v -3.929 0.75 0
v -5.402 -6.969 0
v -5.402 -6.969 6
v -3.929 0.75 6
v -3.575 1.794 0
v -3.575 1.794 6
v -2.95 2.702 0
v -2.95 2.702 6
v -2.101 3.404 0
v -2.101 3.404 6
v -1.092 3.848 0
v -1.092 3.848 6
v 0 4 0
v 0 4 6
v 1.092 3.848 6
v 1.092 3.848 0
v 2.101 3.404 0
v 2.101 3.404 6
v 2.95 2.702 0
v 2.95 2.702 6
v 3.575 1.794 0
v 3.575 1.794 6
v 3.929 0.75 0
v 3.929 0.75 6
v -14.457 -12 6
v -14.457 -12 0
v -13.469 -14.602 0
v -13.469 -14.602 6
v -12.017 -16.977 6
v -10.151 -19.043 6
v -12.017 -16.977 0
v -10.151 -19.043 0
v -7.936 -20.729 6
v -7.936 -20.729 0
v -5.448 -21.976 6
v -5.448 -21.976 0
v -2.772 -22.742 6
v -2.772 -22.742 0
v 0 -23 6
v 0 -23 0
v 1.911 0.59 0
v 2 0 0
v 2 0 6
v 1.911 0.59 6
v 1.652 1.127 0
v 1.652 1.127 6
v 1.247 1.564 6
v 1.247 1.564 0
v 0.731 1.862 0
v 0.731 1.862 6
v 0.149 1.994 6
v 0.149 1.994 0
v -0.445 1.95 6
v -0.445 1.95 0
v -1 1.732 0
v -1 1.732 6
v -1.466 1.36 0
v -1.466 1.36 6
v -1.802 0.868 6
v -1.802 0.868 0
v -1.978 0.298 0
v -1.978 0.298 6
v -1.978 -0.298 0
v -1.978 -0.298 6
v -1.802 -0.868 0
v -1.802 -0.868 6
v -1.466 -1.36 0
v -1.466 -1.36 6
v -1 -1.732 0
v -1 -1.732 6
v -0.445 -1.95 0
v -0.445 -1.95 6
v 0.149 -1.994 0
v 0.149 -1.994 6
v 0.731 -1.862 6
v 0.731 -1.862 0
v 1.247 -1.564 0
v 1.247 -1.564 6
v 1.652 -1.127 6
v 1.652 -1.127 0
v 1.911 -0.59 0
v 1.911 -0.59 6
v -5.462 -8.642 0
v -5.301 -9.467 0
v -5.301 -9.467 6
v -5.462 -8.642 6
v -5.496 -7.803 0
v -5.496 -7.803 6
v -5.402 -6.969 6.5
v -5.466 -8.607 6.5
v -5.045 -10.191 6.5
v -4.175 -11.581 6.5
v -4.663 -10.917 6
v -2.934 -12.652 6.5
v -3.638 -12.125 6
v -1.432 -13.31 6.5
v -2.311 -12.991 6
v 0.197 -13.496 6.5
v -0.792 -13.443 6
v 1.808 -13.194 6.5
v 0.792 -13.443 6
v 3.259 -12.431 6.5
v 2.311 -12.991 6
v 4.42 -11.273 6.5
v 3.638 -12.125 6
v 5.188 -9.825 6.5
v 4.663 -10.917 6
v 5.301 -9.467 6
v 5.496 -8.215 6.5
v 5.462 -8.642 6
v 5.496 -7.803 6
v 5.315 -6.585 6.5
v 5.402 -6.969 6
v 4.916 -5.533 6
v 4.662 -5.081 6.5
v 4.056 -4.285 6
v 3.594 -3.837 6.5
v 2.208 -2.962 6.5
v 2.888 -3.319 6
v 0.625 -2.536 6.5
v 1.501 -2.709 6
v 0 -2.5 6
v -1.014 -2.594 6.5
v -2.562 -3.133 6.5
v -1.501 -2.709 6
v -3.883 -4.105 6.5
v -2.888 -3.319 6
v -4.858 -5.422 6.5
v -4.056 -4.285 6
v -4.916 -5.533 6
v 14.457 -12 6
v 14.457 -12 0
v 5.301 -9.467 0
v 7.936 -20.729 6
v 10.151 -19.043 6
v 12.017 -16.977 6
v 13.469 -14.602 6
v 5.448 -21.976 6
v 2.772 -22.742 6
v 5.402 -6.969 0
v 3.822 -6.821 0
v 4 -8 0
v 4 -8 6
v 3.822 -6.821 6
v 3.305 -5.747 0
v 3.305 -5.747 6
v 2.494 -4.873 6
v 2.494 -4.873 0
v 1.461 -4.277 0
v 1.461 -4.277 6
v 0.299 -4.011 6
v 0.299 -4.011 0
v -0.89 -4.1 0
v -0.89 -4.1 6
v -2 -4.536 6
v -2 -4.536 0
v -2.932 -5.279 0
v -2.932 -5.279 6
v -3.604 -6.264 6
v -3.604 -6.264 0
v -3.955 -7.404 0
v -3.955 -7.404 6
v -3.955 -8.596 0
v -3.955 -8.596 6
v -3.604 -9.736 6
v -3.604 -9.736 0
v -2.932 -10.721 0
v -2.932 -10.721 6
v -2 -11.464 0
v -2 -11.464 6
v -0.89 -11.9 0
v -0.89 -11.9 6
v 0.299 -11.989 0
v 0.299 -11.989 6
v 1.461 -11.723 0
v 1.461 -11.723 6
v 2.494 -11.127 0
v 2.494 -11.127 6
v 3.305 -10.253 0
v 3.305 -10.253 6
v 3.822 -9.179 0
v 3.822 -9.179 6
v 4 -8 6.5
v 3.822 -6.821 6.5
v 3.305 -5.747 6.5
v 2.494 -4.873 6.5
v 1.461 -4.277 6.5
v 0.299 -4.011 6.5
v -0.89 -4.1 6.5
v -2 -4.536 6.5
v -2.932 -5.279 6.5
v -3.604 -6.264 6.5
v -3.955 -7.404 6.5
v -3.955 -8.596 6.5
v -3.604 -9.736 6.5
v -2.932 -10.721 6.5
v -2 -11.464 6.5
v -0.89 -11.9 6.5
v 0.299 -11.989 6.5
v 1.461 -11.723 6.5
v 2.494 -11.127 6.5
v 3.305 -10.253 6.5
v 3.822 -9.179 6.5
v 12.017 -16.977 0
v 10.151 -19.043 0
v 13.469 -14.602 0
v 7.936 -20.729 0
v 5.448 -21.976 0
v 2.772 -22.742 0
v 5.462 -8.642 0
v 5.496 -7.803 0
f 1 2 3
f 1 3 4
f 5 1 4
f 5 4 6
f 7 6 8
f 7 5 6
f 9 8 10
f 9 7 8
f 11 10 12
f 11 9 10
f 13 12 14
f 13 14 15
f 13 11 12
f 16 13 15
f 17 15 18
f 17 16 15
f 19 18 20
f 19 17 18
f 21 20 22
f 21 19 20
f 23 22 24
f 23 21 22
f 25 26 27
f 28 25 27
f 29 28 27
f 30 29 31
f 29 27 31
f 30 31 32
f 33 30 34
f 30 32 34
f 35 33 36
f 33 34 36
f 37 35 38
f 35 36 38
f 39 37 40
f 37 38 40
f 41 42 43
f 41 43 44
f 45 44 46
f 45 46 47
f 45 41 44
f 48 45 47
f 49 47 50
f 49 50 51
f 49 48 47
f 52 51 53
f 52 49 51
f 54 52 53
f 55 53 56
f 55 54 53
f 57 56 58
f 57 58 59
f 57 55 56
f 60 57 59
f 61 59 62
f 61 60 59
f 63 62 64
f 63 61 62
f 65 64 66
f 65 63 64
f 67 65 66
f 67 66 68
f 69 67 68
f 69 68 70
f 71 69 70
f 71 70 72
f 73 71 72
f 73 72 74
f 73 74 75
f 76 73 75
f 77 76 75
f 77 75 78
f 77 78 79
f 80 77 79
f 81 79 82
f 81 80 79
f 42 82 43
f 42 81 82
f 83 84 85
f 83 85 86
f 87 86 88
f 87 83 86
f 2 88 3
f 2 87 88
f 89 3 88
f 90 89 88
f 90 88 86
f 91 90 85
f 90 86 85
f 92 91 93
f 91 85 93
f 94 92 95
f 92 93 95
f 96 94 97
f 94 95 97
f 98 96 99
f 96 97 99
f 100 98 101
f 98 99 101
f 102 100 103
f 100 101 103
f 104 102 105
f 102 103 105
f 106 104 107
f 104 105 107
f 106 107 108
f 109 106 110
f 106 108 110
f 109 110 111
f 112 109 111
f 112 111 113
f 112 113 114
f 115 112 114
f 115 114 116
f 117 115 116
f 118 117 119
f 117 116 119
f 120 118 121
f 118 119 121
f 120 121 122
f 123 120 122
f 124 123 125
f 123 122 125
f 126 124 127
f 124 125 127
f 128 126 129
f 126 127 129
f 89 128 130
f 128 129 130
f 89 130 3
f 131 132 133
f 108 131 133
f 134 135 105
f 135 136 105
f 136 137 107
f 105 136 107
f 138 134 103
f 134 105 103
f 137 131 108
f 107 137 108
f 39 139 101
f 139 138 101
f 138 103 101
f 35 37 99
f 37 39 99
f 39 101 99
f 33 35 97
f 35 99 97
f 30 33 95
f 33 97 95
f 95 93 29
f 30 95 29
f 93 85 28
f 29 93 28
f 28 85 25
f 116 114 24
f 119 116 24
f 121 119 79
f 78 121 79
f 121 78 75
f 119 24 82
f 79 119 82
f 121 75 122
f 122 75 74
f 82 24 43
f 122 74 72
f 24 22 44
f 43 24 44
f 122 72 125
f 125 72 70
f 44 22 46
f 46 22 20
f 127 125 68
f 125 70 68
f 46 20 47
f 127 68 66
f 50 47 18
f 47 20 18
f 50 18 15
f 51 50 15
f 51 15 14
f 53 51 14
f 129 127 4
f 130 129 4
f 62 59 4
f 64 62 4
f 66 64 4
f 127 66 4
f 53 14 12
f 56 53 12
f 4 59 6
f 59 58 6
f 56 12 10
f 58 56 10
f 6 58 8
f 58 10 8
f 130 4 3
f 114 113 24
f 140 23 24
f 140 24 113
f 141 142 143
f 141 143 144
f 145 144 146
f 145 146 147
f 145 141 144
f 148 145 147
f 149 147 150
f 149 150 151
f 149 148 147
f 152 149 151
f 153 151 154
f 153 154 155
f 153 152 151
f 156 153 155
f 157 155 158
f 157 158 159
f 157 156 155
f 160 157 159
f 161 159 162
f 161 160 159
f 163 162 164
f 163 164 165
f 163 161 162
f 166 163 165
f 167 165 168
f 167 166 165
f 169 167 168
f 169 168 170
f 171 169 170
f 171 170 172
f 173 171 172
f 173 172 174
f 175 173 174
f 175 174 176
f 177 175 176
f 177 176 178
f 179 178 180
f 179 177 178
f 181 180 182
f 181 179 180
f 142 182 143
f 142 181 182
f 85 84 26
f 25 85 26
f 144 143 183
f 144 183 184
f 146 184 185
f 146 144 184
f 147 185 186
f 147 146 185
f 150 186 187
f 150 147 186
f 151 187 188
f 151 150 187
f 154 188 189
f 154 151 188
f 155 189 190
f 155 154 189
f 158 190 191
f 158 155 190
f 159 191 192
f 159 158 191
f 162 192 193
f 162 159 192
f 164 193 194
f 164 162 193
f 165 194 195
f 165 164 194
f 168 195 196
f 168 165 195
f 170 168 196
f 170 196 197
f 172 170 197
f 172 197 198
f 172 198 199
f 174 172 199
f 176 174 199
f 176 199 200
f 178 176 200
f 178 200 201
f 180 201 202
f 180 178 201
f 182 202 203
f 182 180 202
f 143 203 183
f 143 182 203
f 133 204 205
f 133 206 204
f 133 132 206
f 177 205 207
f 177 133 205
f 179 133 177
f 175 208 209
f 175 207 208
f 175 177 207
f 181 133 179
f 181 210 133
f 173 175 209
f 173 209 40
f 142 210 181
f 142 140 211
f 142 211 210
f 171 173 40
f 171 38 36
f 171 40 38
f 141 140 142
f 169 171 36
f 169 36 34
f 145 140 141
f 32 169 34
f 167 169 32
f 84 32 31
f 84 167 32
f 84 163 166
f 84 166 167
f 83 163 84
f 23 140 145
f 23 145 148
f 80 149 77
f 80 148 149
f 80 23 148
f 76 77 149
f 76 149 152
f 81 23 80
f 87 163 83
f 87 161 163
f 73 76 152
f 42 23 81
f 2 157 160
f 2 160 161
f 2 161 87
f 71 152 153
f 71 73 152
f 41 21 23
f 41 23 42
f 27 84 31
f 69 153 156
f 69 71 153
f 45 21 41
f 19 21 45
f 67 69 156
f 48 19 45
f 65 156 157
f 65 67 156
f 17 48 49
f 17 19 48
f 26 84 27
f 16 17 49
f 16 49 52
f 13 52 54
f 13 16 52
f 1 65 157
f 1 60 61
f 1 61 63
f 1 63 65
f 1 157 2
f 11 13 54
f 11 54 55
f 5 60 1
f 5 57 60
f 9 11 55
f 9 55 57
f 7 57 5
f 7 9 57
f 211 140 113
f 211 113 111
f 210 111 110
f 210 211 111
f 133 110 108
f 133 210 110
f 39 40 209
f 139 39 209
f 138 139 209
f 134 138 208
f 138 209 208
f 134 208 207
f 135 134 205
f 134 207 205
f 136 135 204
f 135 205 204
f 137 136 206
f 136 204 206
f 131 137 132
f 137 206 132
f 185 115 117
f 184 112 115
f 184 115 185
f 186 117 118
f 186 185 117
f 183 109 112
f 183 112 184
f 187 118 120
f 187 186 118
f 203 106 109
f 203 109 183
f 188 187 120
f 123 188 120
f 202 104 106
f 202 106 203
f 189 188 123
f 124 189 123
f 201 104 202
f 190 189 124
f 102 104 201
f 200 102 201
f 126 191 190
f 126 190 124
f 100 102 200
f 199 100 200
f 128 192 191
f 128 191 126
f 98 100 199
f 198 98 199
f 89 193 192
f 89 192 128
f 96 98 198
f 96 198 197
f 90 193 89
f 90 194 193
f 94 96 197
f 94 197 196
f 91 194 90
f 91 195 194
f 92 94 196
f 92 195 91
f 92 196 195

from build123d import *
from build123d.topology import SkipClean

# Parameters (mm, degrees)
SKETCH1_R           = 2
SKETCH1_R_2         = 4
BOSS_EXTRUDE1_DEPTH = 6
BOSS_EXTRUDE2_START = -6
BOSS_EXTRUDE2_DEPTH = 6
SKETCH3_R           = 5.5
SKETCH3_R_2         = 4
BOSS_EXTRUDE4_DEPTH = 0.5


with BuildPart() as part:
    # Sketch1 → Boss-Extrude1 (new body)
    with BuildSketch(Plane.XY):
        with BuildLine():
            Line((-5.402455316, -6.96875), (-3.929058411, 0.75))
            ThreePointArc((-3.929058411, 0.75), (0, 4), (3.929058411, 0.75))
            Line((3.929058411, 0.75), (5.402455316, -6.96875))
            ThreePointArc((5.402455316, -6.96875), (0, -13.5), (-5.402455316, -6.96875))
        make_face()
        Circle(SKETCH1_R, mode=Mode.SUBTRACT)
        with Locations((0, -8)):
            Circle(SKETCH1_R_2, mode=Mode.SUBTRACT)
    extrude(amount=BOSS_EXTRUDE1_DEPTH)

    # Sketch2 → Boss-Extrude2 (add)
    with BuildSketch(Plane.XY.offset(6).offset(BOSS_EXTRUDE2_START)):
        with BuildLine():
            Line((0, -13.5), (0, -23))
            ThreePointArc((0, -23), (9.082951062, -19.937336386), (14.456832295, -12))
            Line((14.456832295, -12), (5.300838508, -9.466666667))
            ThreePointArc((5.300838508, -9.466666667), (3.33041539, -12.377023342), (0, -13.5))
        make_face()
        with BuildLine():
            Line((-5.300838508, -9.466666667), (-14.456832295, -12))
            ThreePointArc((-14.456832295, -12), (-9.082951062, -19.937336386), (0, -23))
            Line((0, -23), (0, -13.5))
            ThreePointArc((0, -13.5), (-3.33041539, -12.377023342), (-5.300838508, -9.466666667))
        make_face()
    extrude(amount=BOSS_EXTRUDE2_DEPTH)

    # Sketch3 → Boss-Extrude4 (add)
    with SkipClean():  # the faces are left unmerged after this step: merging them gives an invalid solid
        with BuildSketch(Plane.XY.offset(6)):
            with Locations(Location((0, -8, 0), (0, 0, 169.193077125))):
                Circle(SKETCH3_R)
            with Locations((0, -8)):
                Circle(SKETCH3_R_2, mode=Mode.SUBTRACT)
        extrude(amount=BOSS_EXTRUDE4_DEPTH)


solid = part.part
